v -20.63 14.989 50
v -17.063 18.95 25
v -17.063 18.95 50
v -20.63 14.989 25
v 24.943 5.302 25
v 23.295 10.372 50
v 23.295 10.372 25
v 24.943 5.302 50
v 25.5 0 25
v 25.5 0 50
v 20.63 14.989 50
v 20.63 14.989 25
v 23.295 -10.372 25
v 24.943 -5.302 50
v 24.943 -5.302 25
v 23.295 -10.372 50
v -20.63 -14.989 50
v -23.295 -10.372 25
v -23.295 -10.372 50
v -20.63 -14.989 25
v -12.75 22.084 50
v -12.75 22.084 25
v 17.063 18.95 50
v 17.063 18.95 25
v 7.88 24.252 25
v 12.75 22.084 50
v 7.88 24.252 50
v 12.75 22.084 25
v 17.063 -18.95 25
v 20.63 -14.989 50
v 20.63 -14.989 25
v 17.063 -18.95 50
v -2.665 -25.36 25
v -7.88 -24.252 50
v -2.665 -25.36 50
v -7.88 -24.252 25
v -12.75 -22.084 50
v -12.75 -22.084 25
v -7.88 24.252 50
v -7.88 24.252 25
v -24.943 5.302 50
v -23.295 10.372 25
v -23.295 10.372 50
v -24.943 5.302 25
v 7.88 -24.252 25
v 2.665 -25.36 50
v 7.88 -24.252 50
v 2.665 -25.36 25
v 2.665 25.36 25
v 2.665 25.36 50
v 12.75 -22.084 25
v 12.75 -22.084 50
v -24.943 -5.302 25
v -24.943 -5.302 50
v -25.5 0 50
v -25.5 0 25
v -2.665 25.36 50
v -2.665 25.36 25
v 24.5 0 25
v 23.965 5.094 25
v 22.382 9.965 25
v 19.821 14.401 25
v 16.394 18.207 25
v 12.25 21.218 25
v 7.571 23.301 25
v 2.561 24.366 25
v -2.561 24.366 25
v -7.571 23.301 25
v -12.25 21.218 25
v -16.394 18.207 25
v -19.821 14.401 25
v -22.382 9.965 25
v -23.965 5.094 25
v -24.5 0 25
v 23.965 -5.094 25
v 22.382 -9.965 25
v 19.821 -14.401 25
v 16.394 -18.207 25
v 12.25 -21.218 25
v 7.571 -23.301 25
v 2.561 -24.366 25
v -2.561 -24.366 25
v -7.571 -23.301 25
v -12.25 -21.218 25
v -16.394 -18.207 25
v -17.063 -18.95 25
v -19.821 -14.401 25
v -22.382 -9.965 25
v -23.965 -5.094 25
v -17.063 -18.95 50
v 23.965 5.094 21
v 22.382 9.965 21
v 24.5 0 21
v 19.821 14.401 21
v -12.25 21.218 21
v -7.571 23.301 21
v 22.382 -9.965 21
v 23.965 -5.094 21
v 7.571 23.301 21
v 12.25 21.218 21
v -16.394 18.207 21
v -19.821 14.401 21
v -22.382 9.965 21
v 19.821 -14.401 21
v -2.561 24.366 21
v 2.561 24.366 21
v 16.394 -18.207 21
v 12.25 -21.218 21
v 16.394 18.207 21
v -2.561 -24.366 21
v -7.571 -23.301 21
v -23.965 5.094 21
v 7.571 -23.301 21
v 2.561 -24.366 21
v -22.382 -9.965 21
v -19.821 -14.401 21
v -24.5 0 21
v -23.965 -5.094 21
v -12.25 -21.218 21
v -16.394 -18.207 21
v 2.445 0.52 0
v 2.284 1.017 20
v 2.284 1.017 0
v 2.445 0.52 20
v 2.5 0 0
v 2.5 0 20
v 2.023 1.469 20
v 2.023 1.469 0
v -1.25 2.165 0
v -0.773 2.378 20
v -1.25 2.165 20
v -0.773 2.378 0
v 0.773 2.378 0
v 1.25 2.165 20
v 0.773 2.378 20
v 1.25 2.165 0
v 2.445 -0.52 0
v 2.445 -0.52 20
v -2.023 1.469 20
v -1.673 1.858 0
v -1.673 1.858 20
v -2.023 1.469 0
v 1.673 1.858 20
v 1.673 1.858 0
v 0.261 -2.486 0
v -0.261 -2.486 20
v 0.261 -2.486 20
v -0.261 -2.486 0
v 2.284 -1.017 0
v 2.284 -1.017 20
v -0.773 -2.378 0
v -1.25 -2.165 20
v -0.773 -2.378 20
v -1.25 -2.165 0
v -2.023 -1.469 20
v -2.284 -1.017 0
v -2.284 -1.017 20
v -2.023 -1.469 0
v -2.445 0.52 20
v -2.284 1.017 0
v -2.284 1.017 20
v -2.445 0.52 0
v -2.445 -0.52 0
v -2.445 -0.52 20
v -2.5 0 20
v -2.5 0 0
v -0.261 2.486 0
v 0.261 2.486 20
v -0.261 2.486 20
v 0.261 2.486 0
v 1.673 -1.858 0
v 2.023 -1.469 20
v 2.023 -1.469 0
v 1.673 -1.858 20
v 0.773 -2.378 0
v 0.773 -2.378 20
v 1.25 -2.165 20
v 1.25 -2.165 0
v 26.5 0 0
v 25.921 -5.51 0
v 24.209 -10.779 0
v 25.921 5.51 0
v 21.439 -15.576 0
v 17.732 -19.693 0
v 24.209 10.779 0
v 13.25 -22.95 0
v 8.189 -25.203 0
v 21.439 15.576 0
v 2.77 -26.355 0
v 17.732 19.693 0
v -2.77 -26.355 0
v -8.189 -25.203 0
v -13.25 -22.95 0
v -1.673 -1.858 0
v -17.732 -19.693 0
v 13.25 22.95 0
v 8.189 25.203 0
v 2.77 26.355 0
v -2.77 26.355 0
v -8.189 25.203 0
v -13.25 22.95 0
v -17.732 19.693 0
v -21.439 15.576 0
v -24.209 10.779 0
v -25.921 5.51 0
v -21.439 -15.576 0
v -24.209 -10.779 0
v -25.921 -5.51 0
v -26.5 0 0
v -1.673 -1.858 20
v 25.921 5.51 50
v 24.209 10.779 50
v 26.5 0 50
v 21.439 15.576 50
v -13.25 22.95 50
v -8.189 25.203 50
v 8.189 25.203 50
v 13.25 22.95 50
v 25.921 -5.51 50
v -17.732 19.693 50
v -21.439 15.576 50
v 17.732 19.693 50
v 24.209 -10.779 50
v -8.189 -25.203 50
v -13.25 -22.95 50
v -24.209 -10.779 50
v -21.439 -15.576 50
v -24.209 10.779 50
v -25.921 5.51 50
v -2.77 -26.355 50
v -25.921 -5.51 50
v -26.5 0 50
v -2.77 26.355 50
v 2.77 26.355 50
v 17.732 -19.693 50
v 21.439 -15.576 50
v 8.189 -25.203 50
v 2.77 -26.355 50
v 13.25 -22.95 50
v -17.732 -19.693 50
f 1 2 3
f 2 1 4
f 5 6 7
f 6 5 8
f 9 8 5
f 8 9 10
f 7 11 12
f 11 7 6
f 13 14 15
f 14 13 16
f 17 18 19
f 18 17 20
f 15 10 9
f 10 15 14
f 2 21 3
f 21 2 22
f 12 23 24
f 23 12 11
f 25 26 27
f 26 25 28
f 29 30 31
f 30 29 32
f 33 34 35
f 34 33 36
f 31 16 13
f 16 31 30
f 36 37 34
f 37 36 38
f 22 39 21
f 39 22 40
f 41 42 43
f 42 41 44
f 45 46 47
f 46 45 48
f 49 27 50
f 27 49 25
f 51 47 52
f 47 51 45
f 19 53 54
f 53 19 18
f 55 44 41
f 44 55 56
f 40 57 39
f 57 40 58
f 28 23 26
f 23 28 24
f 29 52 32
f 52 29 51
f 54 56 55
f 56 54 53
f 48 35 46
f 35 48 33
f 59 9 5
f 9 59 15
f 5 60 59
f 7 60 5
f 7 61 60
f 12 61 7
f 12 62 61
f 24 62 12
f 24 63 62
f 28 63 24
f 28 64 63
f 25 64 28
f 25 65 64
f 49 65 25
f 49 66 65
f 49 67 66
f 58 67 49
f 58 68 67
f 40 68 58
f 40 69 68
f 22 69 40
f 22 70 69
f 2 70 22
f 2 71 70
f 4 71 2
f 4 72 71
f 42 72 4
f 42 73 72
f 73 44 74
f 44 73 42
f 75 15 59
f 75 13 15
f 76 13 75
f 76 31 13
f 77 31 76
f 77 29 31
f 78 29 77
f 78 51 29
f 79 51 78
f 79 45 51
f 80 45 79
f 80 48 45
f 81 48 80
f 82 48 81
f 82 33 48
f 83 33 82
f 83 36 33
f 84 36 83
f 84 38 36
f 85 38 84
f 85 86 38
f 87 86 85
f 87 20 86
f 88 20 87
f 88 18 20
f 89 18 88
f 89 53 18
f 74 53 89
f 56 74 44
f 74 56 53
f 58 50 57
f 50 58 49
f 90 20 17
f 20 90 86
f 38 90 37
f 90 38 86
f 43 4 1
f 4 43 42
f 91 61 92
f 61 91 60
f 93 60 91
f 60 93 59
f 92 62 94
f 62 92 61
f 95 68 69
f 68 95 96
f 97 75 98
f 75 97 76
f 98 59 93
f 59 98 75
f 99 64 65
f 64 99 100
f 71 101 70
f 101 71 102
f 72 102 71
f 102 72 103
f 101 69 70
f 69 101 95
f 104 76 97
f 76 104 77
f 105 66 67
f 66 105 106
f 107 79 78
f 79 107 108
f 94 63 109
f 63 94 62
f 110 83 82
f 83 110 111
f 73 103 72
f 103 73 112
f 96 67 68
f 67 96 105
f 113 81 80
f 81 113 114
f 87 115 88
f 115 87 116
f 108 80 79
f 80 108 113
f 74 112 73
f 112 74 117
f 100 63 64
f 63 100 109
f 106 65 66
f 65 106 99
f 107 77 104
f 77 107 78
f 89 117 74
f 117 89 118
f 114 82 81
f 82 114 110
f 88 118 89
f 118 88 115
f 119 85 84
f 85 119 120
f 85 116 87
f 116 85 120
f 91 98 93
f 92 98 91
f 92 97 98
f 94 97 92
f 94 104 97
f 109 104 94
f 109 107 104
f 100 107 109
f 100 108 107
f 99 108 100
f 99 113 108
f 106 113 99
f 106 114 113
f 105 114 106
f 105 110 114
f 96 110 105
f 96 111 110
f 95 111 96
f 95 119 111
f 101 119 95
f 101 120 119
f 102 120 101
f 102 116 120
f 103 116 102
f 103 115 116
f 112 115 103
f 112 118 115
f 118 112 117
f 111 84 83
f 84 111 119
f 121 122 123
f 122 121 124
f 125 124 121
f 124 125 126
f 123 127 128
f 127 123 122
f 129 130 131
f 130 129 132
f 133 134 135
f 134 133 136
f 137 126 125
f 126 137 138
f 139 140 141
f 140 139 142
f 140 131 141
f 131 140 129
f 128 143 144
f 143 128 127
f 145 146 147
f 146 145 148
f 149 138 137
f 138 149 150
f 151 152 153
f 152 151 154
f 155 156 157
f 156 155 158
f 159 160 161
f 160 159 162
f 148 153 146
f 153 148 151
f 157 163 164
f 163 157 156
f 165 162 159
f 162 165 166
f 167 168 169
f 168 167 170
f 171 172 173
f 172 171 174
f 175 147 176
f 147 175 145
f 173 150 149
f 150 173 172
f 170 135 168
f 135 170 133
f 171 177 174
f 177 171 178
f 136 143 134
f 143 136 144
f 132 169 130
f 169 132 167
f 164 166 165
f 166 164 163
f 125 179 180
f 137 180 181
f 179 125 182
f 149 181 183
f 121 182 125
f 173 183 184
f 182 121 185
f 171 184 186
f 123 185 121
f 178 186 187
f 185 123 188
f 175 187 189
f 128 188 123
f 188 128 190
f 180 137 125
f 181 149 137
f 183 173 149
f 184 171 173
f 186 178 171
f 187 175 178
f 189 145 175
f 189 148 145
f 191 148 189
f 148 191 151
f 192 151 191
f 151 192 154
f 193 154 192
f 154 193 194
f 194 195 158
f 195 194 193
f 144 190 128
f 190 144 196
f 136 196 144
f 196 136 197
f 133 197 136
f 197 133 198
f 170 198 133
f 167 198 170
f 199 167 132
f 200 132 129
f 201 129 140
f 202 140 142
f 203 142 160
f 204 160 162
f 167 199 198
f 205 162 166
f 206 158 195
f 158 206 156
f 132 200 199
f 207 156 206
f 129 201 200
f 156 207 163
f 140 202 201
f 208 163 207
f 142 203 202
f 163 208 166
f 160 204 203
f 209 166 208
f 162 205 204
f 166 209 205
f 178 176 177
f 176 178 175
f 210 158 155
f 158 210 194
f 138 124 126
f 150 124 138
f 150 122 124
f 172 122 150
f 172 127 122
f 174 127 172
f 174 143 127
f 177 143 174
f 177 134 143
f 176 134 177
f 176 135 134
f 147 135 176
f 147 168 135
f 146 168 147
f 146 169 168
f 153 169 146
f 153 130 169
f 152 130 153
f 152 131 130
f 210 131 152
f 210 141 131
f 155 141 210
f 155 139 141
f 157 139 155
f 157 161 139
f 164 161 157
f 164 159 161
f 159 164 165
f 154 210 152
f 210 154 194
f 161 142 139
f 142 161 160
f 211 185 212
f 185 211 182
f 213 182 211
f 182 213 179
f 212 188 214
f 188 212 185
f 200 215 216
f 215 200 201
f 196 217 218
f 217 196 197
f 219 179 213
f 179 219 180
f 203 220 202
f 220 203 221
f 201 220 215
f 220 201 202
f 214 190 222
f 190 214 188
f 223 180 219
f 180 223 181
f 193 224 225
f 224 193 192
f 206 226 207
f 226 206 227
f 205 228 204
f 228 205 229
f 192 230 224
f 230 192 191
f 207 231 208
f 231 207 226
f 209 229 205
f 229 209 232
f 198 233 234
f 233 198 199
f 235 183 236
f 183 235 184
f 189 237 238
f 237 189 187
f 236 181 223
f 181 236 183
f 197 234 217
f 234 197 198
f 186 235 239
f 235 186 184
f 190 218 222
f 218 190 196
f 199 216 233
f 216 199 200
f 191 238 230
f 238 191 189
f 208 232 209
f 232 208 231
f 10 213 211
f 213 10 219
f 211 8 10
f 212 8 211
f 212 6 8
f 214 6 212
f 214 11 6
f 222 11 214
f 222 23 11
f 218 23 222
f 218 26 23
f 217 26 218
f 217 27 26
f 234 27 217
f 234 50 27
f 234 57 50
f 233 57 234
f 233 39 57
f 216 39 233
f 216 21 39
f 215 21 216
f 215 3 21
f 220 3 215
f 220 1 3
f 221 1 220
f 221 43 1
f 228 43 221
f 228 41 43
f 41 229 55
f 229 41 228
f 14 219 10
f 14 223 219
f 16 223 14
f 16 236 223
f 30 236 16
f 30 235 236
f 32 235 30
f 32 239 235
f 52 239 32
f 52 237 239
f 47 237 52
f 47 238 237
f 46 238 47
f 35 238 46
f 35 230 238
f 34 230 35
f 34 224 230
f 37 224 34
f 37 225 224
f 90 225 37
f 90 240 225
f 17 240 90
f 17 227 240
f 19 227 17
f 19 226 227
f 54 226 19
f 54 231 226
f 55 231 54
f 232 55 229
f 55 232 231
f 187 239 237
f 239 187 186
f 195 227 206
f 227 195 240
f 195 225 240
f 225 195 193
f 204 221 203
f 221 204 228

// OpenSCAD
main_radius = 24.5;
thickness = 1;
bit_radius = 5 / 2;
bit_depth = 20;

$fn = 30;

module spinner(height = 50) {
    difference() {
        cylinder(r = main_radius + (thickness * 2), h = height, $fn = $fn);
        union() {
            translate([0, 0, bit_depth + thickness * 5]) cylinder(r = main_radius + thickness, h = height, $fn = $fn);
            translate([0, 0, bit_depth + thickness]) cylinder(r = main_radius, h = height, $fn = $fn);
            cylinder(r = bit_radius, h = bit_depth, $fn = $fn);
        }
    }
}


spinner();
